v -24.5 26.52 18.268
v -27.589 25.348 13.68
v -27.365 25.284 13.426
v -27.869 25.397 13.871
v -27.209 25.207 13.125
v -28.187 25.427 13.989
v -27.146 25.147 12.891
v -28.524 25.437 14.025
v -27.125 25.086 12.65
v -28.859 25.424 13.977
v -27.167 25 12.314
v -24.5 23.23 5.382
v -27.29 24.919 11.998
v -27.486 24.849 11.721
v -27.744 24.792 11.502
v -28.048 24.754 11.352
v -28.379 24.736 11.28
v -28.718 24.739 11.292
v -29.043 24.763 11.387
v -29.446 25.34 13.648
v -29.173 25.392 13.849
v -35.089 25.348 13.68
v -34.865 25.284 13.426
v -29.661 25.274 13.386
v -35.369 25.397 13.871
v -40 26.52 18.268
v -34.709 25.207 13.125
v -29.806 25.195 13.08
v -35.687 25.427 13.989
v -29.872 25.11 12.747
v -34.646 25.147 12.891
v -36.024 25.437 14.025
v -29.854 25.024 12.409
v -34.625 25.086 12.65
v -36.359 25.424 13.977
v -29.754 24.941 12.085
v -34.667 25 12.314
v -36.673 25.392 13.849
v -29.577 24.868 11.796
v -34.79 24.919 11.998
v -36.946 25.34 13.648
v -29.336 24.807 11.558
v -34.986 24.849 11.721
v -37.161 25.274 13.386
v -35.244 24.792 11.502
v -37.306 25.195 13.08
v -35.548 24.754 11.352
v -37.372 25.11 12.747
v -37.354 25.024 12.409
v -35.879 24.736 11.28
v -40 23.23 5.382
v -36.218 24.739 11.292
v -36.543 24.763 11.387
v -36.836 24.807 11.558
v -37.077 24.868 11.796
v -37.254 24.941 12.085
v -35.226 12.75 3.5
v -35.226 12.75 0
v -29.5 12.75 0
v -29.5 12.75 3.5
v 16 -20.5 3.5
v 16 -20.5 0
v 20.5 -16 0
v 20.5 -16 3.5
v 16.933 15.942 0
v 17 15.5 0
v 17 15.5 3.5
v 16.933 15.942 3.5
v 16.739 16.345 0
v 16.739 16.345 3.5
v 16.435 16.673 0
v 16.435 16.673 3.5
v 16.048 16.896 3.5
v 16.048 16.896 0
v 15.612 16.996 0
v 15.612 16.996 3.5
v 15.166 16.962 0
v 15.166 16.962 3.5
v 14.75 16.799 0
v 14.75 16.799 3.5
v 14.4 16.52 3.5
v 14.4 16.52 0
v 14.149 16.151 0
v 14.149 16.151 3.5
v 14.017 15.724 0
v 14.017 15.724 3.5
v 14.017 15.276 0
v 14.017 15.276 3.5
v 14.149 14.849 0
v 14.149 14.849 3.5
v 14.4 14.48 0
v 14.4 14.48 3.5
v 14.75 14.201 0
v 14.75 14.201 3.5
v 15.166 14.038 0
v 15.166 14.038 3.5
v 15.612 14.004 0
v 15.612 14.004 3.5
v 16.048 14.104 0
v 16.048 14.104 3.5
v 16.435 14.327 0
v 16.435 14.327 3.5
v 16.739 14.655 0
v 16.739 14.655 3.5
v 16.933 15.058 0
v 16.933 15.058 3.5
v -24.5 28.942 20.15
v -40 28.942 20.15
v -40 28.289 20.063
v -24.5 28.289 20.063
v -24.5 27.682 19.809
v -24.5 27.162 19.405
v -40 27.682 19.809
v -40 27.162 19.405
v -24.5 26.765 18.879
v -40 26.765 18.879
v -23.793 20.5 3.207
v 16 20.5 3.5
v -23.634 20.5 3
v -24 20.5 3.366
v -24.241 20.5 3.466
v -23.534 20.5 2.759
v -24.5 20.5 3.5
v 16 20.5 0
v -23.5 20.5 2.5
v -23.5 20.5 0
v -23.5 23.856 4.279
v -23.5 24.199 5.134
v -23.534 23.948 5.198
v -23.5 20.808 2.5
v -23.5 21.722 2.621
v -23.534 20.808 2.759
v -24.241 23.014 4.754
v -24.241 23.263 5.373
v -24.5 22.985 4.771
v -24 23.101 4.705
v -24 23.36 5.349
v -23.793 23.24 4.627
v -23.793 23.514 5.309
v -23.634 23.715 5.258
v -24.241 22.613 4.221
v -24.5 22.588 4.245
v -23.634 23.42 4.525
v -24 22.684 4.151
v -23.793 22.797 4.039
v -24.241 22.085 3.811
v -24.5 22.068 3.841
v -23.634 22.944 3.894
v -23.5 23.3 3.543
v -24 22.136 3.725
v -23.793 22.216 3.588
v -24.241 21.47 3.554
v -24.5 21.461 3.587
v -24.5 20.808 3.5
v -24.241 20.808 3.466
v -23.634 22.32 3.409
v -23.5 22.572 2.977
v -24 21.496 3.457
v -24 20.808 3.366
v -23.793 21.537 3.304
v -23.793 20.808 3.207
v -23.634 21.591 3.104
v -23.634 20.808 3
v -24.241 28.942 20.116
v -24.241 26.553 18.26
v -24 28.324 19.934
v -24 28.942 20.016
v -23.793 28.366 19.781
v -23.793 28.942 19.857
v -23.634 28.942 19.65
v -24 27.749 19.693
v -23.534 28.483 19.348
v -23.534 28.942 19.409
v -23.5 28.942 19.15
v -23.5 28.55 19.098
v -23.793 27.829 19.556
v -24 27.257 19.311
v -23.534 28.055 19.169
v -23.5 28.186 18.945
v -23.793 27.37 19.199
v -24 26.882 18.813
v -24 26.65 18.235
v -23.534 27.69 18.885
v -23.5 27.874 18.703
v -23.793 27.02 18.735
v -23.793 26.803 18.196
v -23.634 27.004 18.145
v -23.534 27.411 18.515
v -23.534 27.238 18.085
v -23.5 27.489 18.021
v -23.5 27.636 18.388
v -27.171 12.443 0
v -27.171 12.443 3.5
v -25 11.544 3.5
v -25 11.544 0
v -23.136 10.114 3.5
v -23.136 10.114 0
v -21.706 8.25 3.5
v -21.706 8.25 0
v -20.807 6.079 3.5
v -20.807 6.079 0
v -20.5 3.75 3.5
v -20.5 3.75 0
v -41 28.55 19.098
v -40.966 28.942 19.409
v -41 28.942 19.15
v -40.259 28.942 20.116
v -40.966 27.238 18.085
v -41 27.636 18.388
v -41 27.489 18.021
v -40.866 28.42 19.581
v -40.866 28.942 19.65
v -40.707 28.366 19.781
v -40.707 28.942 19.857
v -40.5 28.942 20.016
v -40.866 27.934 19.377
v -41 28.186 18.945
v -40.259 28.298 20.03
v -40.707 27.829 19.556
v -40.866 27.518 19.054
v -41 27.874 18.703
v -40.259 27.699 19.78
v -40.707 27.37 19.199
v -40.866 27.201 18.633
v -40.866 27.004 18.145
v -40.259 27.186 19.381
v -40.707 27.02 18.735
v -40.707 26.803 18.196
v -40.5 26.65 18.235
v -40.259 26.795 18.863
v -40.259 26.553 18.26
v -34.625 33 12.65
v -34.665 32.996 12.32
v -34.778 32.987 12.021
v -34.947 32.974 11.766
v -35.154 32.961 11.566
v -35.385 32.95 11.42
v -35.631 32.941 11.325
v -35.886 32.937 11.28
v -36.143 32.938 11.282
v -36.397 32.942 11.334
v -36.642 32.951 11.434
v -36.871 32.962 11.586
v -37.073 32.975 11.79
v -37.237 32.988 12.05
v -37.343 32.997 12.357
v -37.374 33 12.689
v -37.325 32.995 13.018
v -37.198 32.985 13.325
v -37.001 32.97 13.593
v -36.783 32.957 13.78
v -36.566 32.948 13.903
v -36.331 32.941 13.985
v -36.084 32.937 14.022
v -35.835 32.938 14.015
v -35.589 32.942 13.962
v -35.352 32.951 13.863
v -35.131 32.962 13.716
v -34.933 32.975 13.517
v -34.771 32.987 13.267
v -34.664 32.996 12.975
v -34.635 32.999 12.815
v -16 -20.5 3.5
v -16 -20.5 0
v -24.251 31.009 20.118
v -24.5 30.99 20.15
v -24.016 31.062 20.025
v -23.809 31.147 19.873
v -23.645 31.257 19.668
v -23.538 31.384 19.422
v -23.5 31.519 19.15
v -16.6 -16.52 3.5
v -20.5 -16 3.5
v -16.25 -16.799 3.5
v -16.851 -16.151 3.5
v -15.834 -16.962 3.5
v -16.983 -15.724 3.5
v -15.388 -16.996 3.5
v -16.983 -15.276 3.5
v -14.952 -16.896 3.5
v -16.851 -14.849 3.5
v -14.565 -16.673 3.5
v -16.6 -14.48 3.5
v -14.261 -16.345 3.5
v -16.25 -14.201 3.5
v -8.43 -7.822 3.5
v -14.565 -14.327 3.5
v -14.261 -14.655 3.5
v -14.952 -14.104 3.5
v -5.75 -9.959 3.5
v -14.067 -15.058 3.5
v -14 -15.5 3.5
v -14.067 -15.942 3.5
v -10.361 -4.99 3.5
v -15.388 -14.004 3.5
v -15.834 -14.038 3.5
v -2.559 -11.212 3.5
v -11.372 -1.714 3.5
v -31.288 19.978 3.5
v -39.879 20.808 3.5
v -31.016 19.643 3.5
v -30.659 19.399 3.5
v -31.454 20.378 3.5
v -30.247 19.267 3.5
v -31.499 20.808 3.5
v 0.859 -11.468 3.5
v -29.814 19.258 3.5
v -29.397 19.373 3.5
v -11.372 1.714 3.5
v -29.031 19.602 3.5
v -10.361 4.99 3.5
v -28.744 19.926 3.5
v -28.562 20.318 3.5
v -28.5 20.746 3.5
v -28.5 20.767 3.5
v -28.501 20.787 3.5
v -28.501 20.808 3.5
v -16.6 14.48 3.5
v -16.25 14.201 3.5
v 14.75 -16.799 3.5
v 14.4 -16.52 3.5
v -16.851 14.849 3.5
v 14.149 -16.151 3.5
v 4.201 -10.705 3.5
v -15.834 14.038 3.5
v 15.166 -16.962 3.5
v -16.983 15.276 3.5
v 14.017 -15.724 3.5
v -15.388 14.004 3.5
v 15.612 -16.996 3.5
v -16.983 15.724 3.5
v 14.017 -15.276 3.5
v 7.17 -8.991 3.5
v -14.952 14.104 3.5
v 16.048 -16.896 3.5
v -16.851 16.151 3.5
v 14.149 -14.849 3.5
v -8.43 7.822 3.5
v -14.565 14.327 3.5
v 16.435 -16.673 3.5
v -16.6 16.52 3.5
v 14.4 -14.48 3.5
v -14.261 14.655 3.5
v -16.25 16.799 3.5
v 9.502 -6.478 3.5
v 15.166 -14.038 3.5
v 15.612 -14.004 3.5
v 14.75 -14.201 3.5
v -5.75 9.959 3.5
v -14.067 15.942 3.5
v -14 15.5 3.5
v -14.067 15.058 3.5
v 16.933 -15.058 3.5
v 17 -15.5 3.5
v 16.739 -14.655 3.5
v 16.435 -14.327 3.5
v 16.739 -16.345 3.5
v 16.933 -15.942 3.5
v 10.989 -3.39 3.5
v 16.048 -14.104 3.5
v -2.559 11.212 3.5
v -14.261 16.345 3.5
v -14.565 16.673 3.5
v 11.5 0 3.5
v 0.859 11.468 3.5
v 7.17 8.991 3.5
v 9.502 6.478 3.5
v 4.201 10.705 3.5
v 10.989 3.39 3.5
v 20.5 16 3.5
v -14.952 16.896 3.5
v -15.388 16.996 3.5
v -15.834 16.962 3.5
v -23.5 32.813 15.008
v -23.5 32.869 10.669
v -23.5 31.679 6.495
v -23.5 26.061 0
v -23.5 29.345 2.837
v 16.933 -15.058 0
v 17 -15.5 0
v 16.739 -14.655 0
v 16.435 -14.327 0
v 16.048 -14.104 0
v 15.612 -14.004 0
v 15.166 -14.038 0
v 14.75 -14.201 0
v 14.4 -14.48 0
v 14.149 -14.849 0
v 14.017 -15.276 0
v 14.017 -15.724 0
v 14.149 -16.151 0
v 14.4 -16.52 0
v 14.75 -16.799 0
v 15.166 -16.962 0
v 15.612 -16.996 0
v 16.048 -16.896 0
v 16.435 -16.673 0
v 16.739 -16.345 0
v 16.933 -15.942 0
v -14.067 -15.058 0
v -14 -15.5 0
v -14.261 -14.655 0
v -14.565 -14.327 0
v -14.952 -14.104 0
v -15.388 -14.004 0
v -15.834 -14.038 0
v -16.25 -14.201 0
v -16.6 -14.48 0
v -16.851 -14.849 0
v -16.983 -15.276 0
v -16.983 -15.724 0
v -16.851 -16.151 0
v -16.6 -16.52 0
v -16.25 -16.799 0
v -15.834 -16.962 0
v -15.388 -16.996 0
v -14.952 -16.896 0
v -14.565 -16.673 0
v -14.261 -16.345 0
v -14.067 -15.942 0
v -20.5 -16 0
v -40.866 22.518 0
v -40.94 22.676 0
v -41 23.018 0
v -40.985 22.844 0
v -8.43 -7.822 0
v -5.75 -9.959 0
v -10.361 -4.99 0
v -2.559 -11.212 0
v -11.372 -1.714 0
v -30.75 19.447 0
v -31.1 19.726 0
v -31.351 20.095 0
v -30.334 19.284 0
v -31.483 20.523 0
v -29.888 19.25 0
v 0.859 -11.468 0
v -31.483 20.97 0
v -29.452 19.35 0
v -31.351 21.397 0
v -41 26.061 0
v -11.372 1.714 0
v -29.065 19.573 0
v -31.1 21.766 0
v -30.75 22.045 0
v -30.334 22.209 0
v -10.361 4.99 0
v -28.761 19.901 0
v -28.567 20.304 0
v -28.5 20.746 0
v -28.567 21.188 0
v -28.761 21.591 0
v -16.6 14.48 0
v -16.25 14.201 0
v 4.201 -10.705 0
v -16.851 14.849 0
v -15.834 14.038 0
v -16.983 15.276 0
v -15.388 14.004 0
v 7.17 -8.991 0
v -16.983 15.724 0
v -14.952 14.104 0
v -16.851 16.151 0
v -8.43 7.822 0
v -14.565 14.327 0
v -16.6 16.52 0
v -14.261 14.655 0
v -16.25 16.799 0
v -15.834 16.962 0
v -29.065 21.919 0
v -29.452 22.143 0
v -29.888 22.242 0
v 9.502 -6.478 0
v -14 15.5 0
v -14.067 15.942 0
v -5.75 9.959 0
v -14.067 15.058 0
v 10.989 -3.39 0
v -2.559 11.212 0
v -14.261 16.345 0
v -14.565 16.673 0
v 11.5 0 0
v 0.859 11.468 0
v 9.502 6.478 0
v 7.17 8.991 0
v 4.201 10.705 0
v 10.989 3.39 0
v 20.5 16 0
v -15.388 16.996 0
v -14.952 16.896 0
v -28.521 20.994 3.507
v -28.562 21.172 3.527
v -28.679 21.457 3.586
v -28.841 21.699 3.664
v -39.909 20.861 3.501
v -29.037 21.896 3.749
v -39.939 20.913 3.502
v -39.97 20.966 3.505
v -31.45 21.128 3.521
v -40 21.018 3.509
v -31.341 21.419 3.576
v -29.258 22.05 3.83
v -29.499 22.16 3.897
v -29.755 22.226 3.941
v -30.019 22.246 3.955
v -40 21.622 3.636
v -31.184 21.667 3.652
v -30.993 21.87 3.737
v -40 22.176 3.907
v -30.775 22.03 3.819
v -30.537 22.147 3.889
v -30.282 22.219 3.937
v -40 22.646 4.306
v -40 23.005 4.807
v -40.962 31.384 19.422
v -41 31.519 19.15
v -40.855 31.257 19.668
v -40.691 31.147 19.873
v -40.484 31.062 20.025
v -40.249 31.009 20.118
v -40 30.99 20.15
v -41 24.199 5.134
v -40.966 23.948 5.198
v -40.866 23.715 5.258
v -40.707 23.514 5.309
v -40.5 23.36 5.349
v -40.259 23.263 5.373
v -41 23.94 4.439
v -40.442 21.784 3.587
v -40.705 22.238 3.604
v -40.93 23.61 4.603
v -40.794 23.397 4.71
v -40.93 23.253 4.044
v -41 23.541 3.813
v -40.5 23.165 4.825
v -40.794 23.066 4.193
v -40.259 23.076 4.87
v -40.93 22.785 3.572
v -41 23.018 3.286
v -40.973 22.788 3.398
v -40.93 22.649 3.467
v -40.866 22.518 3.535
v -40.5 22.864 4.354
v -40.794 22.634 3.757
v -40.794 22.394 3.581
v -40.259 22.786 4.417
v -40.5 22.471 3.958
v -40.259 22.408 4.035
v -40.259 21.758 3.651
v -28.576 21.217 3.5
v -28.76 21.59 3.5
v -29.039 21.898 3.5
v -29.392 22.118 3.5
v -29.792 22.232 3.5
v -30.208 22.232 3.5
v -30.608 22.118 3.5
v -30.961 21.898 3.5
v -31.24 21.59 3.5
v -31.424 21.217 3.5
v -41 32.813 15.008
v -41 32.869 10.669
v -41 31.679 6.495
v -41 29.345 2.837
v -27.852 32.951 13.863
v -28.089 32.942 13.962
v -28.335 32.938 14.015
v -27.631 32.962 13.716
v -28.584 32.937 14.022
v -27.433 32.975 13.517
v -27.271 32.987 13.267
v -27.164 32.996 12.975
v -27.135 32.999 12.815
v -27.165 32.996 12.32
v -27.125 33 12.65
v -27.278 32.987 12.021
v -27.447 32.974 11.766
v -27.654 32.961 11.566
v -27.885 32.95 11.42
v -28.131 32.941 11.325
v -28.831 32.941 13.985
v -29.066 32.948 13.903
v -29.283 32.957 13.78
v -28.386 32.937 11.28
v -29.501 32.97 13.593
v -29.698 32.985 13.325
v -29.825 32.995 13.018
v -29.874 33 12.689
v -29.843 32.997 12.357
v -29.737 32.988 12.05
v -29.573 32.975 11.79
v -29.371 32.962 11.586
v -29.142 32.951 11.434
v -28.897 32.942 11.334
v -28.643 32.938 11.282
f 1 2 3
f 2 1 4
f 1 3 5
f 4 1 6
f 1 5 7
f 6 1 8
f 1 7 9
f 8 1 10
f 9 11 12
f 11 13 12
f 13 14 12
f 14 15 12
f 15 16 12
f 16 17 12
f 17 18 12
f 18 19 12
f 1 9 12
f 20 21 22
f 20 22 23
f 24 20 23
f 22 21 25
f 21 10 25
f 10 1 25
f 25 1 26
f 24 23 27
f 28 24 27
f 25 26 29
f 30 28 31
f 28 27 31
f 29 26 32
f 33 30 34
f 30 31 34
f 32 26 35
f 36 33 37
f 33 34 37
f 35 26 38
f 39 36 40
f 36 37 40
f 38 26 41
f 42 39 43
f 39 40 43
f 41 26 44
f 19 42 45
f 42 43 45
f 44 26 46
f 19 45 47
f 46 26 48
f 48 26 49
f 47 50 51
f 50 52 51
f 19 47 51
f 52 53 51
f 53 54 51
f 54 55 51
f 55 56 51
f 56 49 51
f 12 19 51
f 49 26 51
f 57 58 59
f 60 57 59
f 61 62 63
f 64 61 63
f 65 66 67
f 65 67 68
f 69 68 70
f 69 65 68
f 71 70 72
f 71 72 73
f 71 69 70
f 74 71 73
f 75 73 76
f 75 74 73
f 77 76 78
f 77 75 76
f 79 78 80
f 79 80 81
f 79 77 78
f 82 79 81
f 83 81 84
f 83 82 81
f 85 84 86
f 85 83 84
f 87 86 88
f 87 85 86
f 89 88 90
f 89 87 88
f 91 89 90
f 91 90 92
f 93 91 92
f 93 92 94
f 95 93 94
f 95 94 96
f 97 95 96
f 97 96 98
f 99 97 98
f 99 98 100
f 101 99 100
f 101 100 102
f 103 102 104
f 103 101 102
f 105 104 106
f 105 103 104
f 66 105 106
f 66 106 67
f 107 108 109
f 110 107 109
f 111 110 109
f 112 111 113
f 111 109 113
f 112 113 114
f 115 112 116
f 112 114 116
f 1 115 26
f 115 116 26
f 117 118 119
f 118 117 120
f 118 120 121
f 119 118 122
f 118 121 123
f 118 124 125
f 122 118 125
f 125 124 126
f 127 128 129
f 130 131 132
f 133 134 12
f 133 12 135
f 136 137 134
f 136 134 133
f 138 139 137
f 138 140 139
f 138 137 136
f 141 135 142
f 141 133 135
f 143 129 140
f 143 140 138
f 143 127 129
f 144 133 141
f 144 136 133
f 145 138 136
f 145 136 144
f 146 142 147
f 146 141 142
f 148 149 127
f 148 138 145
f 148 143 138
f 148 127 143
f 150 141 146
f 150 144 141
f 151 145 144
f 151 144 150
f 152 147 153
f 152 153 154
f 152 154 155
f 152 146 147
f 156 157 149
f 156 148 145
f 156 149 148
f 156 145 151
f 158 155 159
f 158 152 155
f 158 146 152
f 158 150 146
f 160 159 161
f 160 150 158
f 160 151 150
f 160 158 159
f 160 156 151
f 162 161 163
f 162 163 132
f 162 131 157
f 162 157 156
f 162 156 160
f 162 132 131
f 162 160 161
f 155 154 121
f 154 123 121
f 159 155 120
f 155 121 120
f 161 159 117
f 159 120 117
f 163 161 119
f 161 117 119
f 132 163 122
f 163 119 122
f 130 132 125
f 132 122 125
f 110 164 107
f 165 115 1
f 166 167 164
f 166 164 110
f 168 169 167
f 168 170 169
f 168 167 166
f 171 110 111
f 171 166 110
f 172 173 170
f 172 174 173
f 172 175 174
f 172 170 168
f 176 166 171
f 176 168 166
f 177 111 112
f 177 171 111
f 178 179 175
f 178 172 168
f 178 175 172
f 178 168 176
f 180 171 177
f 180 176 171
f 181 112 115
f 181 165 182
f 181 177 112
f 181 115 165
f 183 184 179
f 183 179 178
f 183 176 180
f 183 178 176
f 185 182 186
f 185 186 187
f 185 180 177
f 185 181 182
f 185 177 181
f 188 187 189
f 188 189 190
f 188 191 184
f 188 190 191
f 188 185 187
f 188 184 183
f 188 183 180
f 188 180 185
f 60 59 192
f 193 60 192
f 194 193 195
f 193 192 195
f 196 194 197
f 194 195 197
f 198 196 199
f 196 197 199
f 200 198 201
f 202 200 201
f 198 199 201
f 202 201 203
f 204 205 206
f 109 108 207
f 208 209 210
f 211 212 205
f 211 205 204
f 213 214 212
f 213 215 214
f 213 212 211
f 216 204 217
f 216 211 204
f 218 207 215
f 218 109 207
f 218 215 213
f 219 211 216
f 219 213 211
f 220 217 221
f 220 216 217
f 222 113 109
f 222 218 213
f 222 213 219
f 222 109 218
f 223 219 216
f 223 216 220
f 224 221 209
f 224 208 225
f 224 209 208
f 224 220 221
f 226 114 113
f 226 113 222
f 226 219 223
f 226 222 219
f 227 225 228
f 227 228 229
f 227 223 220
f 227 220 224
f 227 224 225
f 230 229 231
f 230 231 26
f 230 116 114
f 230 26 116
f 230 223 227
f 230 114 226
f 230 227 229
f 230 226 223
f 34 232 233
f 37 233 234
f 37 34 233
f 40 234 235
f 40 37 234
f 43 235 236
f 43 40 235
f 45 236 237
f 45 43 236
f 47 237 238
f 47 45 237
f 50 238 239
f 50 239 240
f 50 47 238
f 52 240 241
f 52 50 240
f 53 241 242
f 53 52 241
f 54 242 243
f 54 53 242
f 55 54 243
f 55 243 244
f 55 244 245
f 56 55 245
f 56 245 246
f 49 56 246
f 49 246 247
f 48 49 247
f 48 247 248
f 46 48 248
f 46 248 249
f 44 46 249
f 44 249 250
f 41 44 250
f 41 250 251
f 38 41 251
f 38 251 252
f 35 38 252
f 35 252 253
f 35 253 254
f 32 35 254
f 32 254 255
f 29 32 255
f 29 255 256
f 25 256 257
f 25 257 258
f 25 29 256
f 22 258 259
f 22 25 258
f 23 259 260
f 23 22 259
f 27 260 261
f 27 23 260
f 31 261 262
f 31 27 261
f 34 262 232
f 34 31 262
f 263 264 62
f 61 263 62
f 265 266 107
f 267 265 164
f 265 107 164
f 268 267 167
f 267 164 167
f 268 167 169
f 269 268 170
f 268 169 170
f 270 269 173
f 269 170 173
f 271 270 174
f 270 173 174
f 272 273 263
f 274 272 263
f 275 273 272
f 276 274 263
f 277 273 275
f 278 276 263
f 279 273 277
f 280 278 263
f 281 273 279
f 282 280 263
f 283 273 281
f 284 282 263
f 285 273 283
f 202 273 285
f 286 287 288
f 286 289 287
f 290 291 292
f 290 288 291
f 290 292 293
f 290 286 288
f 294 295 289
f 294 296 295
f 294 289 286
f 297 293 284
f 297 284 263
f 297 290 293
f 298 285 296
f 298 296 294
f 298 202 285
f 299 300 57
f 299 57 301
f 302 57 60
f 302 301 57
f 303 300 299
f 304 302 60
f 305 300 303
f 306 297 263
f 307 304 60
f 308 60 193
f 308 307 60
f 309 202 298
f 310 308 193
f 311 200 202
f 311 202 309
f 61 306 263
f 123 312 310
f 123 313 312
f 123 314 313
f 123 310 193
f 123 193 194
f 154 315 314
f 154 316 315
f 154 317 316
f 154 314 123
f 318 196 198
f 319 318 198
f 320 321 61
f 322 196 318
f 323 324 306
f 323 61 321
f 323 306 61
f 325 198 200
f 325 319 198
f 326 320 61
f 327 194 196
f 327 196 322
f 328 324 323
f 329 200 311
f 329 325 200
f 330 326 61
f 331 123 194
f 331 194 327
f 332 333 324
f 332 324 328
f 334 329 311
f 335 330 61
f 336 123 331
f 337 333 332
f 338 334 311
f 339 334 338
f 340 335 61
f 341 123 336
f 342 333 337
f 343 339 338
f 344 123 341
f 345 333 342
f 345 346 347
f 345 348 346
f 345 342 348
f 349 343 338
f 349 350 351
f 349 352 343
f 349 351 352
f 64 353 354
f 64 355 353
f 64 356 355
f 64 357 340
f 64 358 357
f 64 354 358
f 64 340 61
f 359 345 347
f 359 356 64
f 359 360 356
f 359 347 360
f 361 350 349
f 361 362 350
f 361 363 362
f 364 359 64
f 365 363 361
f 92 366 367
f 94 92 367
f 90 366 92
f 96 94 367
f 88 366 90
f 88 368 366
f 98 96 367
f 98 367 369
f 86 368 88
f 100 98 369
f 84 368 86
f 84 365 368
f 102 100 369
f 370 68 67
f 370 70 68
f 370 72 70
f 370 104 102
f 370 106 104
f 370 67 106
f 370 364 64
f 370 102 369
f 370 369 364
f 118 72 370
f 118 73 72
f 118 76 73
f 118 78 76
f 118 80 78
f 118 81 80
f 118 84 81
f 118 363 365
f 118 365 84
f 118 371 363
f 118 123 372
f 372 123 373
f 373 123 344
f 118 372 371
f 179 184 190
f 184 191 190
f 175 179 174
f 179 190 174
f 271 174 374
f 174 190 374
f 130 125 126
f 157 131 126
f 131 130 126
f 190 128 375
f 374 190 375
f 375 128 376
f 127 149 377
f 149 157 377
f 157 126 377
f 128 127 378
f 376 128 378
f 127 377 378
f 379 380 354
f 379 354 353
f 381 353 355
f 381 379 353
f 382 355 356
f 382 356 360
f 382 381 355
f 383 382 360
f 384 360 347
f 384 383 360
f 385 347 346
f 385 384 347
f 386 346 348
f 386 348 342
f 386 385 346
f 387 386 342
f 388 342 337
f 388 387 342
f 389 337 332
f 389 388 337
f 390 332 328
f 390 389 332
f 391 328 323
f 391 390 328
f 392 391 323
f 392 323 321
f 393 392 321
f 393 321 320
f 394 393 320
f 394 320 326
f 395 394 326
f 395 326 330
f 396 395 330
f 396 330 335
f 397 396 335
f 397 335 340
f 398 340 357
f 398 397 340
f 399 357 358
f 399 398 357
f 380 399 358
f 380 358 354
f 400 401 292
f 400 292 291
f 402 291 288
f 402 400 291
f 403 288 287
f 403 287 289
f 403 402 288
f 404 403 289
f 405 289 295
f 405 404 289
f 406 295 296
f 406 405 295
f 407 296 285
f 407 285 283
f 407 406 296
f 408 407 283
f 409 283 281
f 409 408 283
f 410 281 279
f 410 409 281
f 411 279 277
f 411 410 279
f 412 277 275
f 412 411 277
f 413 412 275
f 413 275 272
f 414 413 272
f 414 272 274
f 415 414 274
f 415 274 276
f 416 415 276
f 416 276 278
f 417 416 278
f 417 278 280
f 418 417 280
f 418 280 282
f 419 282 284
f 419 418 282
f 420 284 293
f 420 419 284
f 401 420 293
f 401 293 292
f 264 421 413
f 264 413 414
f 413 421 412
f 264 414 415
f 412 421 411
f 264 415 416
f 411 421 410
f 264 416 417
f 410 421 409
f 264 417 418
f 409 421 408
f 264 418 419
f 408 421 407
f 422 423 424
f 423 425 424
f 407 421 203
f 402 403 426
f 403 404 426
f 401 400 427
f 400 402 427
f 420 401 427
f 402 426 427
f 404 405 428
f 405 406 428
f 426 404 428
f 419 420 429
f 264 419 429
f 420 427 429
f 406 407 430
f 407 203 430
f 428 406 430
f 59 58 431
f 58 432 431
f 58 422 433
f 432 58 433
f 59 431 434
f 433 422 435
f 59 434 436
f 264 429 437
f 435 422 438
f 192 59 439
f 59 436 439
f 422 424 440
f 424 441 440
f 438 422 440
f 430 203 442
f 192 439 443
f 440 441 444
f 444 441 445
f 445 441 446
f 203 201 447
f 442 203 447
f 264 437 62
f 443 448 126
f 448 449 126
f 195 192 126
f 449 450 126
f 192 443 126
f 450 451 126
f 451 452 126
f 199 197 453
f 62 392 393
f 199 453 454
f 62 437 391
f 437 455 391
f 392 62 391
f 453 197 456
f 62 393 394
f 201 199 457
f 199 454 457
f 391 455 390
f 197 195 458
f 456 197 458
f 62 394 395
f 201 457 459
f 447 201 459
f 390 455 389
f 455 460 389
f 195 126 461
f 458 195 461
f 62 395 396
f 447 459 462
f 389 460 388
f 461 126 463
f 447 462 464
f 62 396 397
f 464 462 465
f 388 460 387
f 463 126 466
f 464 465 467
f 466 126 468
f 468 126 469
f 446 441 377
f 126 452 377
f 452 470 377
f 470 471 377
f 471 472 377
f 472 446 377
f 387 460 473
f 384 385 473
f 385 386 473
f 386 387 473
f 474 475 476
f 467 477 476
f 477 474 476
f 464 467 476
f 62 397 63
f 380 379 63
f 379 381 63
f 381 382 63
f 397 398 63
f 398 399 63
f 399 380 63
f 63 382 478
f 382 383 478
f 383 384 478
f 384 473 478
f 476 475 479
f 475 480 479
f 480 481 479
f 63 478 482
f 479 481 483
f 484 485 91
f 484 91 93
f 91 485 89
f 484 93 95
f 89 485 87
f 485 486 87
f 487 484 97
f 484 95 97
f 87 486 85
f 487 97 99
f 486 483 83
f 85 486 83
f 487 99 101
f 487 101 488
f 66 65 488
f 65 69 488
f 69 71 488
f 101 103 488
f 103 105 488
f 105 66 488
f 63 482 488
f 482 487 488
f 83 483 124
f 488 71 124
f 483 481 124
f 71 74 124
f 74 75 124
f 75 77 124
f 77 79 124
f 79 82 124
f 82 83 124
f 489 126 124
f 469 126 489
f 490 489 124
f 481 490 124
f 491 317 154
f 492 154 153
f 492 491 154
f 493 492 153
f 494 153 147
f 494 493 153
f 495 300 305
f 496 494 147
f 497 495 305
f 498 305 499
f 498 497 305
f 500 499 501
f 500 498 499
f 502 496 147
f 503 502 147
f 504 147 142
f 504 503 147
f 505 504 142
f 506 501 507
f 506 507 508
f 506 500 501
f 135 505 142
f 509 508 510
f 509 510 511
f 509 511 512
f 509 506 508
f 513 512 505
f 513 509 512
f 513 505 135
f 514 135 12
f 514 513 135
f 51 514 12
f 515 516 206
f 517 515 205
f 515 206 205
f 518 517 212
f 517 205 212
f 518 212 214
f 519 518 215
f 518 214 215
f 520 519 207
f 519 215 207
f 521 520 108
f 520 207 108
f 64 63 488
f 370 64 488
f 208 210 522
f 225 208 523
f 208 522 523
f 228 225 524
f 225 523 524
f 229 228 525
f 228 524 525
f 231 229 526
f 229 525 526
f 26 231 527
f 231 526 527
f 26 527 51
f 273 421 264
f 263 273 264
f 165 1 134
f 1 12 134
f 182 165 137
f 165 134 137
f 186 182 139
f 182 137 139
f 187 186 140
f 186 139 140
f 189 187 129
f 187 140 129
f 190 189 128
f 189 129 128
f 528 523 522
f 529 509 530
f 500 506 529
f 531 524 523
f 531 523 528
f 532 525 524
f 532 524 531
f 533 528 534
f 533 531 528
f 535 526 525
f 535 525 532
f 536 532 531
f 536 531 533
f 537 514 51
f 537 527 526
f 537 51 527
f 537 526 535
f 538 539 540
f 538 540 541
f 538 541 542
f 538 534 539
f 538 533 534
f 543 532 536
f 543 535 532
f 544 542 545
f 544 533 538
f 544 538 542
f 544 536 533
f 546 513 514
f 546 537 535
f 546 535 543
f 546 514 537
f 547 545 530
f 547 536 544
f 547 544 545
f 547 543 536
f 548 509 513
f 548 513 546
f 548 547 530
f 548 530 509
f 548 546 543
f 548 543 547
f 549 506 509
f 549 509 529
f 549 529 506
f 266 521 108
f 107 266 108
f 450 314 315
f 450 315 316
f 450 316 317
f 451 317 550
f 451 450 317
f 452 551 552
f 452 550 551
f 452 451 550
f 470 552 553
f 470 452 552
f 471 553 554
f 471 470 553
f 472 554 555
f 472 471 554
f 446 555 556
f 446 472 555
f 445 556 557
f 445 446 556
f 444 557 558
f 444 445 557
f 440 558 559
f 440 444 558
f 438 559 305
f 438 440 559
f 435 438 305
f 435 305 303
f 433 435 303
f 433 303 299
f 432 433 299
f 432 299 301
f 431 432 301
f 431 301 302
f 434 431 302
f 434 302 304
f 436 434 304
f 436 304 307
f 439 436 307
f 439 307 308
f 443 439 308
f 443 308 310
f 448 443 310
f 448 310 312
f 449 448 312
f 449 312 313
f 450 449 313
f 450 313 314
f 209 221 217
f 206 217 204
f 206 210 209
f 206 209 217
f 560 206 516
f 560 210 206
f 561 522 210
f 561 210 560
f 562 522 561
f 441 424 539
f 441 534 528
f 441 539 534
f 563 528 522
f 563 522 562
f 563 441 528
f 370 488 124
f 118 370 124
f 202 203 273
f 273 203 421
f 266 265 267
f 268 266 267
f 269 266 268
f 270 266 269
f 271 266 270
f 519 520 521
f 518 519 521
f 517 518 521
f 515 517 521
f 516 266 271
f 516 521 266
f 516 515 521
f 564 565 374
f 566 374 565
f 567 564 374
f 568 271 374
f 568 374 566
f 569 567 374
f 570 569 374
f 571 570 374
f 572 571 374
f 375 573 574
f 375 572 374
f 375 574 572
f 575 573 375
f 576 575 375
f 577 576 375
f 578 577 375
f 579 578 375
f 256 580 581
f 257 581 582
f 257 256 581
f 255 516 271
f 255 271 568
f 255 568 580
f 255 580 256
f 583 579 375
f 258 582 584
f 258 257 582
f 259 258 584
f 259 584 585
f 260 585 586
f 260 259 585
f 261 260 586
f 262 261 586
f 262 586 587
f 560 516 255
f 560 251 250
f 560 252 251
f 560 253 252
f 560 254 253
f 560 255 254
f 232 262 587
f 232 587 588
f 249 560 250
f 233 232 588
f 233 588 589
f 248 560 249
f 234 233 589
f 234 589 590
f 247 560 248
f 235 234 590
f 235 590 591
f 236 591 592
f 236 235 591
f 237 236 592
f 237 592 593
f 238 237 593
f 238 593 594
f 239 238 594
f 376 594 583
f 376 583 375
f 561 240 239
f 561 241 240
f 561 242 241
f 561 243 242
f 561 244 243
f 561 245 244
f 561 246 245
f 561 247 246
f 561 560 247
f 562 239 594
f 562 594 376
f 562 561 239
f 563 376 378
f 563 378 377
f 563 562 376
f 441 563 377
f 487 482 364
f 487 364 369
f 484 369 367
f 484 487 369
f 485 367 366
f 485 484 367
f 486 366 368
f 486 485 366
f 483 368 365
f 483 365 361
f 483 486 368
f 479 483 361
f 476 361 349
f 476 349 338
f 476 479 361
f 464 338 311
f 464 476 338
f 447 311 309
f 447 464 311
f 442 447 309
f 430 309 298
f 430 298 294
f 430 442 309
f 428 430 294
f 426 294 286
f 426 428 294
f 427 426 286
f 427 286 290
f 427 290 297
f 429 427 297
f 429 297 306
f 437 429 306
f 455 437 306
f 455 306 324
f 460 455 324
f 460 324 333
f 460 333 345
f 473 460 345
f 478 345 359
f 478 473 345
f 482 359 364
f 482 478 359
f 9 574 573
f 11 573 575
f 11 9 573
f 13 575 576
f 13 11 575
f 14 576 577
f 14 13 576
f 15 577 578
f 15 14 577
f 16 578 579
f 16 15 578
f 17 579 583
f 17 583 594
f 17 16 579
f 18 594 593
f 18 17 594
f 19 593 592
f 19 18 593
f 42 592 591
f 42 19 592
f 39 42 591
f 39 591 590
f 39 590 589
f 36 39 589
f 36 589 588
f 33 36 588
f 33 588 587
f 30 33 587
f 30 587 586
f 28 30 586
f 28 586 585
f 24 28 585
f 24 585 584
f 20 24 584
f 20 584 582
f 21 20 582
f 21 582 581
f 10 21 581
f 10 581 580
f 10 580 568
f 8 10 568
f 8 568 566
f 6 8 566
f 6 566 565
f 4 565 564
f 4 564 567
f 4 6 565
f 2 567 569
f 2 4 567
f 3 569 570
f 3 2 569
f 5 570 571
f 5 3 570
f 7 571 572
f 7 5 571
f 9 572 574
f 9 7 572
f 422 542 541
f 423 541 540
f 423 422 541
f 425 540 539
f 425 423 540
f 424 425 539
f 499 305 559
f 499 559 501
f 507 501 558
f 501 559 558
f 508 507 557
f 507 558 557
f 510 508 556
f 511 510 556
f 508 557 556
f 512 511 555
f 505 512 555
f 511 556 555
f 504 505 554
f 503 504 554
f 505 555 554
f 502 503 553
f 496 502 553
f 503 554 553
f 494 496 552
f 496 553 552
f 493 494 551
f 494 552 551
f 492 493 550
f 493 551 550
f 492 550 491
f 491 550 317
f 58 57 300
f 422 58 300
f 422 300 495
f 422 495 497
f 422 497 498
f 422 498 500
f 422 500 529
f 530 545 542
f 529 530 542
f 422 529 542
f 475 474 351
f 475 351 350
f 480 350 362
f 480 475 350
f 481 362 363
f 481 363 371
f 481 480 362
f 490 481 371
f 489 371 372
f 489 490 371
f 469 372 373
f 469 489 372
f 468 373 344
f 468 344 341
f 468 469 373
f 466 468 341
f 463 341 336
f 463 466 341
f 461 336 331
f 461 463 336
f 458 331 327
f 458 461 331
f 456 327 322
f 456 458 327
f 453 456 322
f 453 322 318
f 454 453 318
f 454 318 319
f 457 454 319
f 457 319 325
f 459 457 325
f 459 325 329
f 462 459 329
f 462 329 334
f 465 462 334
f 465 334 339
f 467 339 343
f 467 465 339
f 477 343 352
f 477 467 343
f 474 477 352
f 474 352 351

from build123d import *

# Parameters (mm, degrees)
SKETCH1_R           = 11.5
SKETCH1_R_2         = 1.4999999999999991
SKETCH1_R_3         = 1.4999999999999987
SKETCH1_R_4         = 1.5000000000000009
SKETCH1_R_5         = 1.5000000000000002
BOSS_EXTRUDE1_DEPTH = 3.5
BOSS_EXTRUDE2_DEPTH = 17.5
CUT_EXTRUDE1_DEPTH  = 73.64483808227534
SKETCH4_R           = 1.3750000000000042
SKETCH4_R_2         = 1.375000000000001
CUT_EXTRUDE2_DEPTH  = 266.22147666332955
FILLET1_R           = 2.5
FILLET2_R           = 1


with BuildPart() as part:
    # Sketch1 → Boss-Extrude1 (new body)
    with BuildSketch(Plane.XY):
        with BuildLine():
            Line((-20.5, -16.000000000000007), (-15.999999999999996, -20.500000000000007))
            Line((-15.999999999999996, -20.500000000000007), (16.000000000000004, -20.5))
            Line((16.000000000000004, -20.5), (20.5, -16))
            Line((20.5, -16), (20.5, 16))
            Line((20.5, 16), (16.000000000000004, 20.5))
            Line((16.000000000000004, 20.5), (-23.500000000000007, 20.5))
            Line((-23.500000000000007, 20.5), (-23.500000000000007, 33))
            Line((-23.500000000000007, 33), (-41.00000000000001, 33))
            Line((-41.00000000000001, 33), (-41.00000000000001, 22.75))
            Line((-41.00000000000001, 22.75), (-35.22649730810378, 12.75))
            Line((-35.22649730810378, 12.75), (-29.500000000000007, 12.750000000000002))
            ThreePointArc((-29.500000000000007, 12.750000000000002), (-23.136038969321078, 10.11396103067893), (-20.500000000000004, 3.750000000000001))
            Line((-20.500000000000004, 3.750000000000001), (-20.5, -16.000000000000007))
        make_face()
        Circle(SKETCH1_R, mode=Mode.SUBTRACT)
        with Locations((-15.500000000000002, 15.5)):
            Circle(SKETCH1_R_2, mode=Mode.SUBTRACT)
        with Locations((15.500000000000002, 15.499999999999998)):
            Circle(SKETCH1_R_3, mode=Mode.SUBTRACT)
        with Locations((15.5, -15.5)):
            Circle(SKETCH1_R_4, mode=Mode.SUBTRACT)
        with Locations((-15.5, -15.5)):
            Circle(SKETCH1_R_5, mode=Mode.SUBTRACT)
        with Locations((-30.00000000000001, 20.746197723675813)):
            Circle(SKETCH1_R_4, mode=Mode.SUBTRACT)
    extrude(amount=BOSS_EXTRUDE1_DEPTH)

    # Sketch2 → Boss-Extrude2 (add)
    with BuildSketch(Plane.ZY.offset(41.00000000000001)):
        Polygon((3.5, 33), (20.15, 33), (20.15, 27.000000000000004), (3.5, 22.75), align=None)
    extrude(amount=-BOSS_EXTRUDE2_DEPTH)

    # Sketch3 → Cut-Extrude1 (cut, through all)
    with BuildSketch(Plane.ZY.offset(41.00000000000001)):
        with BuildLine():
            Line((0, 26.060862236758553), (0, 38.04576260464925))
            Line((0, 38.04576260464925), (20.15, 38.04576260464925))
            Line((20.15, 38.04576260464925), (20.149999999999995, 30.990381056766584))
            ThreePointArc((20.149999999999995, 30.990381056766584), (9.085499481104915, 32.57032381420525), (0, 26.060862236758553))
        make_face()
    extrude(amount=-CUT_EXTRUDE1_DEPTH, mode=Mode.SUBTRACT)

    # Sketch4 → Cut-Extrude2 (cut, through all)
    with BuildSketch(Plane(origin=(-1.4737e-13, -20.499999999999993, -236.3635116976825), x_dir=(1, 2.2e-16, 0), z_dir=(-2.2e-16, 1, 0))):
        with Locations((-35.99999999999985, -249.01351169768247)):
            Circle(SKETCH4_R)
        with Locations((-28.499999999999844, -249.01351169768247)):
            Circle(SKETCH4_R_2)
    extrude(amount=CUT_EXTRUDE2_DEPTH, mode=Mode.SUBTRACT)

    # Fillet1
    # the kernel refuses this fillet: 2.5 mm, written as the material it adds along each edge
    with BuildSketch(Plane(origin=(-41.00000000000001, 22.75, 3.5), x_dir=(0, -1, 0), z_dir=(1, 0, 0))) as fillet1_piece_1_section:
        with BuildLine():
            CenterArc((FILLET1_R * 0.776808330642, -FILLET1_R), FILLET1_R, 90, 75.68071687498136)
            Line((-FILLET1_R * 0.192124217376, -FILLET1_R * 0.752674875131), (0, 0))
            Line((0, 0), (FILLET1_R * 0.776808330642, 0))
        make_face()
    fillet1_piece_1 = extrude(amount=17.5, mode=Mode.PRIVATE)
    fillet1_piece_1 = split(fillet1_piece_1, bisect_by=Plane(origin=(-38.678687412646255, 18.729368658454117, 3.931557915234251), z_dir=(0.8660254037844398, 0.49999999999999795, 0)), keep=Keep.TOP, mode=Mode.PRIVATE)
    fillet1_piece_1 = fillet1_piece_1 - Plane(origin=(-30.00000000000001, 20.746197723675813, 3.931557915234251), x_dir=(1, 0, 0), z_dir=(0, 0, -1)) * Cylinder(1.5000000000000009, 43, mode=Mode.PRIVATE)
    add(fillet1_piece_1)
    # the kernel refuses this fillet: 2.5 mm, written as the material it takes off along each edge
    with BuildSketch(Plane(origin=(-45.855052066513494, 27.000000000000004, 20.15), x_dir=(0, 1, 0), z_dir=(1, 0, 0))) as fillet1_2_piece_1:
        with BuildLine():
            CenterArc((FILLET1_R * 0.776808330642, -FILLET1_R), FILLET1_R, 90, 75.68071687498119)
            Line((-FILLET1_R * 0.192124217376, -FILLET1_R * 0.752674875131), (0, 0))
            Line((0, 0), (FILLET1_R * 0.776808330642, 0))
        make_face()
    extrude(amount=27.21010413302697, mode=Mode.SUBTRACT)

    # Fillet2
    fillet2_edges = [part.edges().sort_by_distance(p)[0] for p in [
        (-41.00000000000001, 24.875, 11.825),
        (-23.500000000000007, 24.875, 11.825),
        (-41.00000000000001, 29.96620094168579, 20.15),
        (-41, 27.408362134202072, 19.624307730627862),
        (-23.500000000000007, 29.96620094168579, 20.15),
        (-23.5, 27.408362134202072, 19.624307730627862),
        (-41, 23.04189744334401, 4.877676890023187),
        (-23.5, 22.341637865797928, 4.025692269372136),
        (-41, 22.749999999999133, 2.2128286226876686),
        (-23.500000000000007, 20.6539895866975, 3.5),
    ]]
    fillet(fillet2_edges, radius=FILLET2_R)


solid = part.part
